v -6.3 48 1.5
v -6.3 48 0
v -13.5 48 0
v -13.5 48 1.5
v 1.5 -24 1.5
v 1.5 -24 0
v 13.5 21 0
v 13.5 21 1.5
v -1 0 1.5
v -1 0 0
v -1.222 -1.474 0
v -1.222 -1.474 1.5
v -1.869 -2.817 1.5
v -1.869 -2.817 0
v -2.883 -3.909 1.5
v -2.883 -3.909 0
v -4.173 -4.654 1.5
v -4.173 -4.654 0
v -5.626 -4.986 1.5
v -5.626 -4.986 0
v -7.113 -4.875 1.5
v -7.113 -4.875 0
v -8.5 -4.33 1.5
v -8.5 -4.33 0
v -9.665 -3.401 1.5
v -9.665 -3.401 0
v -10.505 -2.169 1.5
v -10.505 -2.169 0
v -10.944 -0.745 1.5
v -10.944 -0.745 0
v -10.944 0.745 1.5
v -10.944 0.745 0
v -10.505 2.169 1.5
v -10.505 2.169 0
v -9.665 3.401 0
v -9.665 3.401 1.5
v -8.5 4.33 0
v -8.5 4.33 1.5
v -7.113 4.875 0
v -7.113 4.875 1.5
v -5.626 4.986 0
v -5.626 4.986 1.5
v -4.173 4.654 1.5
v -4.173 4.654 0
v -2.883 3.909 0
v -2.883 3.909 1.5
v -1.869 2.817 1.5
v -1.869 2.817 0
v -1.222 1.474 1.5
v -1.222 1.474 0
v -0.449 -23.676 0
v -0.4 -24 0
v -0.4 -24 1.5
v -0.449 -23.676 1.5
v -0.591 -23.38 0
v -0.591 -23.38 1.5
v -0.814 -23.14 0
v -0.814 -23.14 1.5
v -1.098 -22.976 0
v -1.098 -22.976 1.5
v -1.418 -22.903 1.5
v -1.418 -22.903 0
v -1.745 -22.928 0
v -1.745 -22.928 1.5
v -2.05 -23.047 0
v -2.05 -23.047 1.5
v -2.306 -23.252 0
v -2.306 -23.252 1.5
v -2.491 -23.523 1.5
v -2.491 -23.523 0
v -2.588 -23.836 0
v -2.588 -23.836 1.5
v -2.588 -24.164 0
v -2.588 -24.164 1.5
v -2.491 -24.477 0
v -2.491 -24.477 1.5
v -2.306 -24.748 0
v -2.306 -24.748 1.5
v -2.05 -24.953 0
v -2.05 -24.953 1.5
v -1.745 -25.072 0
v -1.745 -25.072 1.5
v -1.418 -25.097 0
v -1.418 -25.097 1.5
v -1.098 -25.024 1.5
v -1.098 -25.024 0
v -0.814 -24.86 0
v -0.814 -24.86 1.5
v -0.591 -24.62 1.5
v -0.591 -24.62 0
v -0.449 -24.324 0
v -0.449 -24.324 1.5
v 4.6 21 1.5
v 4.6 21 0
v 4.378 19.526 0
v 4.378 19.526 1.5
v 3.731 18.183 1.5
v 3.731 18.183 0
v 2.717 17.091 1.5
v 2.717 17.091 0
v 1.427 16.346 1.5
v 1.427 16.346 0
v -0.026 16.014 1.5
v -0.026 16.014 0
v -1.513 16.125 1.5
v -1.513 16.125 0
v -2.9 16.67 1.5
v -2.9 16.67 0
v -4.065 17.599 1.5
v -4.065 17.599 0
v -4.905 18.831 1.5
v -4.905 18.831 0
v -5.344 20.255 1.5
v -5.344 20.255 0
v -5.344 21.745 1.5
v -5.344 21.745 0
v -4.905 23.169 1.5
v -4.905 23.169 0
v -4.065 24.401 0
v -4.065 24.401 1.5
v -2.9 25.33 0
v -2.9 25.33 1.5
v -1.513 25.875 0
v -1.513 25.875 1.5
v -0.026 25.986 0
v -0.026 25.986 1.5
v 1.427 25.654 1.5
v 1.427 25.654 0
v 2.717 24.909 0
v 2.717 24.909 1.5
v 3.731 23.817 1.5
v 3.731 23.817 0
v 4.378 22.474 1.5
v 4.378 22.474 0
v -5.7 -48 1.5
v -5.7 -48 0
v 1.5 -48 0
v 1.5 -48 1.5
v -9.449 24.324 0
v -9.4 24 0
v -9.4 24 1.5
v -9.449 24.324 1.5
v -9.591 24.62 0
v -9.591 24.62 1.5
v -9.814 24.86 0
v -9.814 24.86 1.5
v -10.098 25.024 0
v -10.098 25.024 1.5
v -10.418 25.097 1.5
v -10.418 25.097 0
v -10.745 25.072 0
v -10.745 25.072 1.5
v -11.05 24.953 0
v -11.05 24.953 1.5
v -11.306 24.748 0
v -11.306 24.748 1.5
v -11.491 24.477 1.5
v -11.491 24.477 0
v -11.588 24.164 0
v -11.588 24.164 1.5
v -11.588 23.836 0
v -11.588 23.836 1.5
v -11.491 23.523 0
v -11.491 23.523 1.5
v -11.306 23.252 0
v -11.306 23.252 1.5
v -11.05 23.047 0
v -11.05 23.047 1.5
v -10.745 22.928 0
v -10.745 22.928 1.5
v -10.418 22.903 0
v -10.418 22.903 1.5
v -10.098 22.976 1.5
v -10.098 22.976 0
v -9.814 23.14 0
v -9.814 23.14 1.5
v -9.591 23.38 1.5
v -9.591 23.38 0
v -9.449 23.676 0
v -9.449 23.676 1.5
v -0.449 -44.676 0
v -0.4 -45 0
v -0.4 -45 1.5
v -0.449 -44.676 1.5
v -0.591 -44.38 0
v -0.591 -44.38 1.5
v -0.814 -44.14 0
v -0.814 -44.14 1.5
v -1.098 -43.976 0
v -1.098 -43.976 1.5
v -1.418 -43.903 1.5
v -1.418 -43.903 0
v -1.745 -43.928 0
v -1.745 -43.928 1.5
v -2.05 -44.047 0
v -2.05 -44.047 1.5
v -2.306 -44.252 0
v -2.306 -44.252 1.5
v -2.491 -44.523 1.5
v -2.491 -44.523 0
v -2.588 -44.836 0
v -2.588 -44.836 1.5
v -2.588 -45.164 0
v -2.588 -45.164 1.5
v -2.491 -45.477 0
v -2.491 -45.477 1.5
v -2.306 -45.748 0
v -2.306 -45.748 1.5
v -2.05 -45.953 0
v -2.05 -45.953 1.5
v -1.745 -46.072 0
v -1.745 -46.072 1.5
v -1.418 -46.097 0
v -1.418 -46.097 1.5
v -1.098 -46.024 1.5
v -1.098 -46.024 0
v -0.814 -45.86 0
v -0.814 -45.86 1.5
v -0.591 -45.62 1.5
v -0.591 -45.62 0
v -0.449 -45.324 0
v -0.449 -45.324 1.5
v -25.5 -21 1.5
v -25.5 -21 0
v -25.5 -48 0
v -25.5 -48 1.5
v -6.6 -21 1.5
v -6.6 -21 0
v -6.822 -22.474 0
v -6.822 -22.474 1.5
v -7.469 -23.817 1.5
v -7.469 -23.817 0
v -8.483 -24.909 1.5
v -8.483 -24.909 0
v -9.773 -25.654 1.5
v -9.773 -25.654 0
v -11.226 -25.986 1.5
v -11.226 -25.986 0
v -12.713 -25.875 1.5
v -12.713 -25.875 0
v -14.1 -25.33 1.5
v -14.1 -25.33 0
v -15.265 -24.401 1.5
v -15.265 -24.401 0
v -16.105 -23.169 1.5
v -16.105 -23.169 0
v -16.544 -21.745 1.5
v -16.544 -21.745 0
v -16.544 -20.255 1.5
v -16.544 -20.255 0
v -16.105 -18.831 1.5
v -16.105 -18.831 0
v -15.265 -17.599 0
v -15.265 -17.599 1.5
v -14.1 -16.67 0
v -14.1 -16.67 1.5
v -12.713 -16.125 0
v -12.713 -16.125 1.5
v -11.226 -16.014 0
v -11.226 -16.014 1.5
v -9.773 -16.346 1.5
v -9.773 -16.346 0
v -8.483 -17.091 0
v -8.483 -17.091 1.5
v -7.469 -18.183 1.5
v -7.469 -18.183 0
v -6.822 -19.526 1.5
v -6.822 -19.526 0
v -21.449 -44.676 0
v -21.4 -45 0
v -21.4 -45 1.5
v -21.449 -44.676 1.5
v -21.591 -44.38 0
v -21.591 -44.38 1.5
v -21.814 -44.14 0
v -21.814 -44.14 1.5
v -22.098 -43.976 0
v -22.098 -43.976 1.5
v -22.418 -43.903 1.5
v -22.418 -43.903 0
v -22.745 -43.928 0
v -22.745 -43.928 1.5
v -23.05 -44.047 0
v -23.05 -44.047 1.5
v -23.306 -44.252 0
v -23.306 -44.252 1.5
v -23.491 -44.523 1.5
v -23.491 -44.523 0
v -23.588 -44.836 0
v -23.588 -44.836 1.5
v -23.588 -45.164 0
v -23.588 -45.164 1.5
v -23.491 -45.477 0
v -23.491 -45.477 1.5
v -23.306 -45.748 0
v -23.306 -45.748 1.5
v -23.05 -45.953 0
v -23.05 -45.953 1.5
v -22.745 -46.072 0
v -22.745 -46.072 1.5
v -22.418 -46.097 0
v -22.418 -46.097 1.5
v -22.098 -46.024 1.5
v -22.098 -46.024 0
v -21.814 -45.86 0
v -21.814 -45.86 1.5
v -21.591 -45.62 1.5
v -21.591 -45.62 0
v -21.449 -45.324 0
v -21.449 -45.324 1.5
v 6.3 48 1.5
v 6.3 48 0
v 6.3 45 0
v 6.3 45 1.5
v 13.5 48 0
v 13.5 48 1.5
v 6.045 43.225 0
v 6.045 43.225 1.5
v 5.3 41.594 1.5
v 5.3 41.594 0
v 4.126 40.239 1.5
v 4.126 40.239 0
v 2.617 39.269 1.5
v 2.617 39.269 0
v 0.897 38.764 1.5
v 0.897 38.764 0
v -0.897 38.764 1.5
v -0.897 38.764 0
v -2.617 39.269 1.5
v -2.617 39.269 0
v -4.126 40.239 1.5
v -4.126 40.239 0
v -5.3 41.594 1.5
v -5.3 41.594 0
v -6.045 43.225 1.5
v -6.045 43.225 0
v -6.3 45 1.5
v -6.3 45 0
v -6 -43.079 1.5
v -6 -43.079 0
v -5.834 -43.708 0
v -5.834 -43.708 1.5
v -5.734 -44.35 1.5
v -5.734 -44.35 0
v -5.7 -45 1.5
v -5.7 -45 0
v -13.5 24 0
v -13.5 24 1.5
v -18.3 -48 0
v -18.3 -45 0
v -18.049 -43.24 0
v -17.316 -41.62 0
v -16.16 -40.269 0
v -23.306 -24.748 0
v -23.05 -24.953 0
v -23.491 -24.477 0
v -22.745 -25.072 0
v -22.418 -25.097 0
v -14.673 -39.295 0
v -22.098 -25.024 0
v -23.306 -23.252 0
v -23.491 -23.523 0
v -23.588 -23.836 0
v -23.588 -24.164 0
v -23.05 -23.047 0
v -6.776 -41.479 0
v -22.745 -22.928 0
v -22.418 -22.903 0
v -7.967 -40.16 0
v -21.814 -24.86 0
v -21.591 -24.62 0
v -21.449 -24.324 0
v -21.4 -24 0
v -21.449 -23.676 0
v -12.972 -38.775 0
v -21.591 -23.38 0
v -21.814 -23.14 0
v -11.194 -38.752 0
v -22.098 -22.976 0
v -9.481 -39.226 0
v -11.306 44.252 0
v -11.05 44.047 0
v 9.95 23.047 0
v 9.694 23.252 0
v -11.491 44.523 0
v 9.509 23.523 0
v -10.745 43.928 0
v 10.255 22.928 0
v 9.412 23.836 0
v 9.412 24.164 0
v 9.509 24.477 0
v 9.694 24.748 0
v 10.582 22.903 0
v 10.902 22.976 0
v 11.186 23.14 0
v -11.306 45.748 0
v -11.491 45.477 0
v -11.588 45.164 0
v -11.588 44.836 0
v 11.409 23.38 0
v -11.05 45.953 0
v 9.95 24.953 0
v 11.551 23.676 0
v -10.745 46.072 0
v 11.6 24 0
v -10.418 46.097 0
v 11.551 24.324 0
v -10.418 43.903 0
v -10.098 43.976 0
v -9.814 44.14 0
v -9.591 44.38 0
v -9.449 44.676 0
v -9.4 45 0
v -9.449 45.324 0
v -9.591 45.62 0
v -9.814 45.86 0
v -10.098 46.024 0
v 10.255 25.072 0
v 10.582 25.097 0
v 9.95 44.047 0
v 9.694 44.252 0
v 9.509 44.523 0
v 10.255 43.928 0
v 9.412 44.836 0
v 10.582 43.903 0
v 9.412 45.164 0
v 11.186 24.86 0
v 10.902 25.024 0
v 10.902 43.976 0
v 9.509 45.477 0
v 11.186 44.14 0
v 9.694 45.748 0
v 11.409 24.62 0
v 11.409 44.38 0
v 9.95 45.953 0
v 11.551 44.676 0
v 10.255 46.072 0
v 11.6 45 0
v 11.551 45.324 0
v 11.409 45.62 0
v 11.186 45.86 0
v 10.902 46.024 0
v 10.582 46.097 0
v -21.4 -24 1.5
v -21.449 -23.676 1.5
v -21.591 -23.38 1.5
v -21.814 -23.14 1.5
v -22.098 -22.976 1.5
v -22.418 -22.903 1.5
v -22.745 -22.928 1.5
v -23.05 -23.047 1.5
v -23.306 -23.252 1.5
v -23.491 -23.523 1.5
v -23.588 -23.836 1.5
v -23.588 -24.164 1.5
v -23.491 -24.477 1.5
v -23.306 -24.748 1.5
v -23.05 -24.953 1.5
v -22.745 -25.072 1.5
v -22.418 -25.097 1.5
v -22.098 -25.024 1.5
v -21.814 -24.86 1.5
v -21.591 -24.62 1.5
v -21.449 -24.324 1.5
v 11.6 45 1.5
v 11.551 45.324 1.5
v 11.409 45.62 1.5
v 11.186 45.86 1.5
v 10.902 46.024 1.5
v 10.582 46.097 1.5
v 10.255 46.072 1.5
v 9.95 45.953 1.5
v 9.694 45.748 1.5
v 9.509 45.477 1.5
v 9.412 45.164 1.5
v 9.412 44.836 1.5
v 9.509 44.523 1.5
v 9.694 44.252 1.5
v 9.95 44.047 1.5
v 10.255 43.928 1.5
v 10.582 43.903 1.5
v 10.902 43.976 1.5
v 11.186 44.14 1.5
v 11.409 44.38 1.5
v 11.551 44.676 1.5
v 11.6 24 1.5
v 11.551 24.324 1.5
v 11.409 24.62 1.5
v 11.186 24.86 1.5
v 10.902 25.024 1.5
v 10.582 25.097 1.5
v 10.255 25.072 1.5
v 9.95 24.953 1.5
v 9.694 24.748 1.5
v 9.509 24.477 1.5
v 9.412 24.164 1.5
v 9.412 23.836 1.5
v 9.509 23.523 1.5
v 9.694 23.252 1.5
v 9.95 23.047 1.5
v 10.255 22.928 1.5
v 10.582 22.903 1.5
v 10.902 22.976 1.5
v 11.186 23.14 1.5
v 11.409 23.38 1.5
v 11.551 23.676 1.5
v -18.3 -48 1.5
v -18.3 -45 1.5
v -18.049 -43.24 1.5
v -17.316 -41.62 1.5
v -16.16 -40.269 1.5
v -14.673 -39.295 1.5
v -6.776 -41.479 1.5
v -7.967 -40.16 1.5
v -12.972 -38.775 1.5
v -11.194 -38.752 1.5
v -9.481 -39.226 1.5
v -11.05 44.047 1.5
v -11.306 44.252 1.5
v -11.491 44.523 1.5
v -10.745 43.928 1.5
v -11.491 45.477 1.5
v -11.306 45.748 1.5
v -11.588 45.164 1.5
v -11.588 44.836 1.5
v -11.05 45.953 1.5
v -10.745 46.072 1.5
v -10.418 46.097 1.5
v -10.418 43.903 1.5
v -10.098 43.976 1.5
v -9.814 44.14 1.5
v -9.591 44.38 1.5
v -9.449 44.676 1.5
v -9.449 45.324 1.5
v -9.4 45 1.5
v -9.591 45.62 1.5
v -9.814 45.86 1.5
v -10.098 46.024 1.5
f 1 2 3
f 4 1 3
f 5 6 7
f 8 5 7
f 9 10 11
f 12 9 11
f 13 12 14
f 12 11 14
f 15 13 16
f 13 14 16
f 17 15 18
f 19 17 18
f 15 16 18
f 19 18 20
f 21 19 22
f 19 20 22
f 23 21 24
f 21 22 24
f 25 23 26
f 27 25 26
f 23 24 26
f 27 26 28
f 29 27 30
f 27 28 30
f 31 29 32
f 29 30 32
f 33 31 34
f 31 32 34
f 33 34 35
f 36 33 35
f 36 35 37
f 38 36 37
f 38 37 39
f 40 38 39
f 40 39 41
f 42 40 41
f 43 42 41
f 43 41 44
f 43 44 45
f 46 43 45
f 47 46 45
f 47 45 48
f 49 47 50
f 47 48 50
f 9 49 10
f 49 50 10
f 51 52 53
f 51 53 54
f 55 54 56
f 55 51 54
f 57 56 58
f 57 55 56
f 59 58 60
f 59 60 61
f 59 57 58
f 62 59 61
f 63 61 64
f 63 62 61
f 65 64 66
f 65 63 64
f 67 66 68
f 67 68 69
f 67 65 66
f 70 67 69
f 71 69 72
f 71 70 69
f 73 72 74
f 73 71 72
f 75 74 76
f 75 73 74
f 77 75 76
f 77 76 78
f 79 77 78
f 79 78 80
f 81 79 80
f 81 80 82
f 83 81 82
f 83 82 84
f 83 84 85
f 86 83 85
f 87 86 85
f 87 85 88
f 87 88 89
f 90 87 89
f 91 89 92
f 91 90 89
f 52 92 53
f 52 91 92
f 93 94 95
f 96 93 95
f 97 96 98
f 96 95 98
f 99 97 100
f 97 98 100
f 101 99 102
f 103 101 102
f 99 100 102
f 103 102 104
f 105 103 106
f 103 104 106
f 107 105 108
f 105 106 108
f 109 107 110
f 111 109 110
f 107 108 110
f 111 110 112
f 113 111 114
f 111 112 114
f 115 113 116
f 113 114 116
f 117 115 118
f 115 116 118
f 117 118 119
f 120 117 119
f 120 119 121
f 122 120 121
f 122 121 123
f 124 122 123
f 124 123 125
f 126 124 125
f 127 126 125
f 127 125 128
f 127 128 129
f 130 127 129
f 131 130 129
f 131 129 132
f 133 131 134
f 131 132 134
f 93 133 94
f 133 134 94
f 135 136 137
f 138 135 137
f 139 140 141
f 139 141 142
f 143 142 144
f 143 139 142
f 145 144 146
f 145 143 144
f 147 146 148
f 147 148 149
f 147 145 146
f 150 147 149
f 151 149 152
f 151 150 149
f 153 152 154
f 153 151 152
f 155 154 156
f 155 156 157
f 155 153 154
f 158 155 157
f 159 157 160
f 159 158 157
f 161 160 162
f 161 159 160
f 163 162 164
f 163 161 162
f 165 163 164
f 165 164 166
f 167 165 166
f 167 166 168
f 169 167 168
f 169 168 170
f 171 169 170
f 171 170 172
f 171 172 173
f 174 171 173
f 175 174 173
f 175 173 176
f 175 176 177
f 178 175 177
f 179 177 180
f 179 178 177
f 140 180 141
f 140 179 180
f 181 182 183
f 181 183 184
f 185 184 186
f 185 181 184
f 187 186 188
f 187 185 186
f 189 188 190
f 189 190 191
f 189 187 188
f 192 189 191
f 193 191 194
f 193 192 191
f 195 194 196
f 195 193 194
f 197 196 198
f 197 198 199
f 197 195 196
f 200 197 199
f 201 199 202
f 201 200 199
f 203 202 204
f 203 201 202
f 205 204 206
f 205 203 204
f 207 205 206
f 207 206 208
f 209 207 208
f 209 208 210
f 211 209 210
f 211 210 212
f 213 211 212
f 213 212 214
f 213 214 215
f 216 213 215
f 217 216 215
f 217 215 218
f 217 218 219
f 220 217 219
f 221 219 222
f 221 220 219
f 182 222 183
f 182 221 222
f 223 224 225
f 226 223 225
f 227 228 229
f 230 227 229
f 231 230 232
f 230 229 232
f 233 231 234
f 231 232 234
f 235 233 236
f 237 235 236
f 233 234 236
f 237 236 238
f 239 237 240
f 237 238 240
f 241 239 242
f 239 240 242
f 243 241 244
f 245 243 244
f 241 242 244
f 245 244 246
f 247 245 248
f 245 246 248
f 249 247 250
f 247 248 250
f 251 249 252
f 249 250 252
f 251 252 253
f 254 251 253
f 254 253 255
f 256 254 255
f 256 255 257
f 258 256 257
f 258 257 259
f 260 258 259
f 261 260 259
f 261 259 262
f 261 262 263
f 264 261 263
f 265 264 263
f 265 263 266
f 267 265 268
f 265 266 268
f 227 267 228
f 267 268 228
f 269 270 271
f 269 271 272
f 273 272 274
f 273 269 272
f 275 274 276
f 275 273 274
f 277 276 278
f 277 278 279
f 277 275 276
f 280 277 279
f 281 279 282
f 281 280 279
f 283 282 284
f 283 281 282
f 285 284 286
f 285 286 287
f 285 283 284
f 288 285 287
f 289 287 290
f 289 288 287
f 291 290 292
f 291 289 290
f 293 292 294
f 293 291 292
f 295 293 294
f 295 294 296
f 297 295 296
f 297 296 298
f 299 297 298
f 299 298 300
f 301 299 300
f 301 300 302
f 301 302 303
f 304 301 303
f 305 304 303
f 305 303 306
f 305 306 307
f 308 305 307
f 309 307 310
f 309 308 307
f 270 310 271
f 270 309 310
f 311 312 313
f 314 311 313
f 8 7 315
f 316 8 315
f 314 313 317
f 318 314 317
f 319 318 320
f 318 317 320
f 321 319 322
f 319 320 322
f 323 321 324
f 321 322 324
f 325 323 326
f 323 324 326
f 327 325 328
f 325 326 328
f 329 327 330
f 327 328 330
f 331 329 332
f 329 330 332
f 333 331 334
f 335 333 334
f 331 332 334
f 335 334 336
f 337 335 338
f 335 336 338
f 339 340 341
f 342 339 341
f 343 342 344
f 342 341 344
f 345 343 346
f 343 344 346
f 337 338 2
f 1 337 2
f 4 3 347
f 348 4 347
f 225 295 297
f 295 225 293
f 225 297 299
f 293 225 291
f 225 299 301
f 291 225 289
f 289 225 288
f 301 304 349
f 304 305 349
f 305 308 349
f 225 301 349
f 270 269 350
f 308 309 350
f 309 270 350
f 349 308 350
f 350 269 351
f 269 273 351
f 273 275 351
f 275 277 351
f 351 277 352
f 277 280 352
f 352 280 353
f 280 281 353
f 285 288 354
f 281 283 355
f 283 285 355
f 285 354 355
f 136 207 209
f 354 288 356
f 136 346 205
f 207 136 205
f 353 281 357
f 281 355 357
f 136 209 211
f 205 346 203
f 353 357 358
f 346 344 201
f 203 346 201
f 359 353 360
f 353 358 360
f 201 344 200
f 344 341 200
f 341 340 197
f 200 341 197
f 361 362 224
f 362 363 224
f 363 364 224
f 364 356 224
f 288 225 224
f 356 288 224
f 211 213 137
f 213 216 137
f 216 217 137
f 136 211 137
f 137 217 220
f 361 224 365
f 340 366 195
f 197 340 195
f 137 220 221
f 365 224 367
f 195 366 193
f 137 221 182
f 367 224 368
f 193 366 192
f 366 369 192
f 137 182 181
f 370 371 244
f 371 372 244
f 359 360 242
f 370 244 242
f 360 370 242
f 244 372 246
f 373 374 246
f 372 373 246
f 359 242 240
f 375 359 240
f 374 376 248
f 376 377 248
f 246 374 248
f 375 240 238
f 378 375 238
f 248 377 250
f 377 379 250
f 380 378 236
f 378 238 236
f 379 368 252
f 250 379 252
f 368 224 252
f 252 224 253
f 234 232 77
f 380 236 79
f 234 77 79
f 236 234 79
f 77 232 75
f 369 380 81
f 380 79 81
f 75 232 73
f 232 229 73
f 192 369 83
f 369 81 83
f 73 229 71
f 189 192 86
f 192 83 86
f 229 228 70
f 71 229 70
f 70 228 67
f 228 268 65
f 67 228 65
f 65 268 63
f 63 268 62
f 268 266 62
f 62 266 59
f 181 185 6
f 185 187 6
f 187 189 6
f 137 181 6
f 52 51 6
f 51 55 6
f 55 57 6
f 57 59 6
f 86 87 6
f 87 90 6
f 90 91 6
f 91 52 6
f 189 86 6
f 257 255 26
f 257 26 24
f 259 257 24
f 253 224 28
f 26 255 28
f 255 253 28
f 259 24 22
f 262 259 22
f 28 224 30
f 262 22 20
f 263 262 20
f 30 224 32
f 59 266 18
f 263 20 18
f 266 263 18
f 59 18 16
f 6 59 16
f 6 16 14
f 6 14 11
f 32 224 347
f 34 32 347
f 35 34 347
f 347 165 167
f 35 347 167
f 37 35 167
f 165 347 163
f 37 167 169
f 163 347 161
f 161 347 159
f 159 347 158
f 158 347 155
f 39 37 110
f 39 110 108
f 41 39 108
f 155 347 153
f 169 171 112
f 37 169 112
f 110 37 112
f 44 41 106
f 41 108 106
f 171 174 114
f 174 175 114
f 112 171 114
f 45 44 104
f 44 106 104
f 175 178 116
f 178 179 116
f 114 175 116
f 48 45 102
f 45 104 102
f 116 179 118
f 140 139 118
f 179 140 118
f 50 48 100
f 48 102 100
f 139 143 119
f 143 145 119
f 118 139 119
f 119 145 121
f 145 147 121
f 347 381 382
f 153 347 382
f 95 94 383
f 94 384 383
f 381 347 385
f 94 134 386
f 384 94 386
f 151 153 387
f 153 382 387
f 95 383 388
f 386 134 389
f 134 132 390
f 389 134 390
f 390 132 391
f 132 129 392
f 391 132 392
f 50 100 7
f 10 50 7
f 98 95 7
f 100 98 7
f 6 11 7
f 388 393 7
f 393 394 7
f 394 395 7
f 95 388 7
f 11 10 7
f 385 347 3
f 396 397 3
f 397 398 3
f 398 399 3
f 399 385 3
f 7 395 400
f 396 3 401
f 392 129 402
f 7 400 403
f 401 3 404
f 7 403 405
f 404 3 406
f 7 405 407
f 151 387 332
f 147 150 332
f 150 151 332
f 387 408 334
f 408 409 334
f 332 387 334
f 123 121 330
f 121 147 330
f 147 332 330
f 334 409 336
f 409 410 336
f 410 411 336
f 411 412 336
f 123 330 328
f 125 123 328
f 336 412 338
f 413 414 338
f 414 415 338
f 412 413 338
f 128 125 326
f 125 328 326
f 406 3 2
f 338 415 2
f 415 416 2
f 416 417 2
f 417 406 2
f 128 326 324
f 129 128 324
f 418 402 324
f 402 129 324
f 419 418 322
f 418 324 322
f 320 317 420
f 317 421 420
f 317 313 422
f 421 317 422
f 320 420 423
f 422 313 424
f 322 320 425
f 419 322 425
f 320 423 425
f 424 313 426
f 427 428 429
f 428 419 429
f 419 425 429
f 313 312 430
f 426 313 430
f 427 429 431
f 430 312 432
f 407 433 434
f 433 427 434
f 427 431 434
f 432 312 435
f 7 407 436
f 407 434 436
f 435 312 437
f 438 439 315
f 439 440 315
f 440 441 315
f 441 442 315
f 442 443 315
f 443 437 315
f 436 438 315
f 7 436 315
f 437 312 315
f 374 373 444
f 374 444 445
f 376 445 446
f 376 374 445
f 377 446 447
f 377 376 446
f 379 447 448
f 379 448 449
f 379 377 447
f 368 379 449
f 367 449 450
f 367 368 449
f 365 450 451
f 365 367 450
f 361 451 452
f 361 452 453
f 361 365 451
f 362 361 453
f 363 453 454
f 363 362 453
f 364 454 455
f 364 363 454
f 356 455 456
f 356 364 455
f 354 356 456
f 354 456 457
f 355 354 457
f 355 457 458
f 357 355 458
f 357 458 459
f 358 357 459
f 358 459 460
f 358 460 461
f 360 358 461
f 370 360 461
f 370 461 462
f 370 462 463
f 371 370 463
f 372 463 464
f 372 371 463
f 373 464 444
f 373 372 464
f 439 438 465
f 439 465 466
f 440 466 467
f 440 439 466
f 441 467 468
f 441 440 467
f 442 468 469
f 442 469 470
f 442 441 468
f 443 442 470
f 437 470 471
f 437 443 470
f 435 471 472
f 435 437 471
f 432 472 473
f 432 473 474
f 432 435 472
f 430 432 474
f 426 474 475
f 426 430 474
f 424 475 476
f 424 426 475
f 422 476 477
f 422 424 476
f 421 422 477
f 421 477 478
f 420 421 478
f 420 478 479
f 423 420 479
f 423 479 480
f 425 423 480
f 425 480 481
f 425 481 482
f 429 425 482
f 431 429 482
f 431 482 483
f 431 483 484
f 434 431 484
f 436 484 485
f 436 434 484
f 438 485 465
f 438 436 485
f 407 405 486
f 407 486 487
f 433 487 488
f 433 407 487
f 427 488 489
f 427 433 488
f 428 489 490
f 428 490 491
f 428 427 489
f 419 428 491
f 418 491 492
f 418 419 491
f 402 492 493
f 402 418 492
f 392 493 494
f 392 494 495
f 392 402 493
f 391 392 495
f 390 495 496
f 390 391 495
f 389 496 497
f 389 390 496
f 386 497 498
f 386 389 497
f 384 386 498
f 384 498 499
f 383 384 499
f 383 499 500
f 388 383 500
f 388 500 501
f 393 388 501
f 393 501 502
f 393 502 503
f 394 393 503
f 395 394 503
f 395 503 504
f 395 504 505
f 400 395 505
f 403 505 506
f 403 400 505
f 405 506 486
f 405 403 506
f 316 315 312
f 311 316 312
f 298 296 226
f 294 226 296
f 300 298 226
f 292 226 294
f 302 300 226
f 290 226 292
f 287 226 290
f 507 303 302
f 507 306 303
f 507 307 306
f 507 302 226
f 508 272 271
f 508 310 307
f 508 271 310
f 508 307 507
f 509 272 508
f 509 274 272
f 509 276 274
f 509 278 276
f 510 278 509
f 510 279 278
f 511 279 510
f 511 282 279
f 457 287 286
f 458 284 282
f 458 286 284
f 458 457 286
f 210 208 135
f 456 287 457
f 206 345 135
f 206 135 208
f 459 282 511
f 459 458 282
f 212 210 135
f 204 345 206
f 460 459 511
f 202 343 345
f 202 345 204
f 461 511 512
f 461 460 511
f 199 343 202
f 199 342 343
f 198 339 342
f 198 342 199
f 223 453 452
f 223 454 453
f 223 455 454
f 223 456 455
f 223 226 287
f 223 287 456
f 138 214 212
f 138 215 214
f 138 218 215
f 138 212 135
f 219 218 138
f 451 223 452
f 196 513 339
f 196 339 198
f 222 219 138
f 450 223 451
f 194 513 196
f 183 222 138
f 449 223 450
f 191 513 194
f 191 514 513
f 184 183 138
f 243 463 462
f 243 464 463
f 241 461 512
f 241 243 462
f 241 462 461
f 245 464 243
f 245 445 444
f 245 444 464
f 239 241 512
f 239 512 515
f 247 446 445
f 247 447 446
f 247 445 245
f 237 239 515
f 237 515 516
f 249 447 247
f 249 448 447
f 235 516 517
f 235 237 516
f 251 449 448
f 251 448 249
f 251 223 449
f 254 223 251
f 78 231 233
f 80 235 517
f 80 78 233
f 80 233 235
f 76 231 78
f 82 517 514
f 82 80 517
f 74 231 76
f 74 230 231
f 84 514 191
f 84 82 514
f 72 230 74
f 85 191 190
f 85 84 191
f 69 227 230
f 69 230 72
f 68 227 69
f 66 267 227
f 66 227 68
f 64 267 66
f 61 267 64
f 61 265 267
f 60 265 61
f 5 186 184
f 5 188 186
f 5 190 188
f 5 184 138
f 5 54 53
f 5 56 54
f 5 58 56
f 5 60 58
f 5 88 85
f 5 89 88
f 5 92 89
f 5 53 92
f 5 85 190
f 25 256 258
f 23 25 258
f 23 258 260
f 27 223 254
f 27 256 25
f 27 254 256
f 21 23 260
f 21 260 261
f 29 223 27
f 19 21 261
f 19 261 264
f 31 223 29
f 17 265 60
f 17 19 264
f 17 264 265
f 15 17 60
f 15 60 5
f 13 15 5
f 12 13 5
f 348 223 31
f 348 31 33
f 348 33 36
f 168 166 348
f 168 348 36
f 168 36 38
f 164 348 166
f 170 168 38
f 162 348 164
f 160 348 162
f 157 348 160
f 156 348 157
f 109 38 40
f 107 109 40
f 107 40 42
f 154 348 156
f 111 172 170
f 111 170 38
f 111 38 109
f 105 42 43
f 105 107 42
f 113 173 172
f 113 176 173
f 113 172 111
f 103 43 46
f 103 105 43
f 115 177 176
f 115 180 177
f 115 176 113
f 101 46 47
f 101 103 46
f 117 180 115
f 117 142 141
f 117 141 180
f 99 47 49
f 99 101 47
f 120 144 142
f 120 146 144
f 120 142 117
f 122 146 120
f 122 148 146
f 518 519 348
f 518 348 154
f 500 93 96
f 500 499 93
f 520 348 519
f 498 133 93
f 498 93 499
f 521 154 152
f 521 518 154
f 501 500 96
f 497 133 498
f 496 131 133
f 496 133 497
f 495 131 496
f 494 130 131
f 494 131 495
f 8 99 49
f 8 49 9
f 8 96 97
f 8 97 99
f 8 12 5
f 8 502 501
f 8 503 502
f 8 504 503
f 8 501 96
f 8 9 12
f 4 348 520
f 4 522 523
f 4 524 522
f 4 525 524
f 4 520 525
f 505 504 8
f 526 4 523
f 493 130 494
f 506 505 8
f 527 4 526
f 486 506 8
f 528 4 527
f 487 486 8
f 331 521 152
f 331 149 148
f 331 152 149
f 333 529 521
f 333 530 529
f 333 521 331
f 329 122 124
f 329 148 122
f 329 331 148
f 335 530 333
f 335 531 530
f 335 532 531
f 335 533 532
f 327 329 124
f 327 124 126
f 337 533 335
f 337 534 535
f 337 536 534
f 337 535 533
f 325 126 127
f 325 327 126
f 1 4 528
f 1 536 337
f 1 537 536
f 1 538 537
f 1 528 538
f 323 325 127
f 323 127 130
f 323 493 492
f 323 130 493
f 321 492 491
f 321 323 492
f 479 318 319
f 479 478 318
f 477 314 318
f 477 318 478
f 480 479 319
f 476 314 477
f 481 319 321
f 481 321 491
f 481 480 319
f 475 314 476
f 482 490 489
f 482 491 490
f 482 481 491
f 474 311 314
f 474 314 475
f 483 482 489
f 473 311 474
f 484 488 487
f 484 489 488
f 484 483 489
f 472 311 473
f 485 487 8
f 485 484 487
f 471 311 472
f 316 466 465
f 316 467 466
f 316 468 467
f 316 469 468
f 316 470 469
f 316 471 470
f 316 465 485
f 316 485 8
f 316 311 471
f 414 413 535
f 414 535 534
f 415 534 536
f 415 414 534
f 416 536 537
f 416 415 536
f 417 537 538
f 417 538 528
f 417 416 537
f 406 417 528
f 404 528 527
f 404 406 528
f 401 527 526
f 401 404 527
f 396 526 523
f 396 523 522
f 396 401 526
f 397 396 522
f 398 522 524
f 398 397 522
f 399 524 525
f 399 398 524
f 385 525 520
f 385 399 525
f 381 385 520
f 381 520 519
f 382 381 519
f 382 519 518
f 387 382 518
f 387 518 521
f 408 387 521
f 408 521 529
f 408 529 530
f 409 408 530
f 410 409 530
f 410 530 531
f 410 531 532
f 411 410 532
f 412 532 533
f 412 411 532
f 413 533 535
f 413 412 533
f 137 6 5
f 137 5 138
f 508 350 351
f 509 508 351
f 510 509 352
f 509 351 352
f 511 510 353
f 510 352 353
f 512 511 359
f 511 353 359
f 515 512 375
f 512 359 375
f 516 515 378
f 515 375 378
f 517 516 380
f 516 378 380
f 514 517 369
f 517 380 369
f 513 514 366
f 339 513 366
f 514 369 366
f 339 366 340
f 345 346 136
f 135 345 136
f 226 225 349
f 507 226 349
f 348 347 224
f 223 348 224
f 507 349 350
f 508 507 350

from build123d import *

# Parameters (mm, degrees)
F0_R     = 1.1
F1_DEPTH = 1.5
F2_W     = 12
F2_H     = 24
F3_DEPTH = 1.5
F4_R     = 5
F5_DEPTH = 1.5


# Not quite as in the source:
# - a feature names something its author has since deleted; it is built from what else it names


with BuildPart() as f1:
    # F0 (on Top) → F1 (new body)
    with BuildSketch(Plane.XY):
        with BuildLine():
            Line((-5.7, -48), (6.3, -48))
            Line((6.3, -48), (6.3, -45))
            ThreePointArc((6.3, -45), (0.9721111048, -38.7754518236), (-6, -43.0790627288))
            ThreePointArc((-6, -43.0790627288), (-5.7754518236, -44.0278888952), (-5.7, -45))
            Line((-5.7, -45), (-5.7, -48))
        make_face()
        with Locations((-1.5, -45)):
            Circle(F0_R, mode=Mode.SUBTRACT)
        with BuildLine():
            Line((25.5, -48), (25.5, 48))
            Line((25.5, 48), (6.3, 48))
            Line((6.3, 48), (6.3, 45))
            ThreePointArc((6.3, 45), (0, 38.7), (-6.3, 45))
            Line((-6.3, 45), (-6.3, 48))
            Line((-6.3, 48), (-25.5, 48))
            Line((-25.5, 48), (-25.5, -48))
            Line((-25.5, -48), (-18.3, -48))
            Line((-18.3, -48), (-18.3, -45))
            ThreePointArc((-18.3, -45), (-12.9721111048, -38.7754518236), (-6, -43.0790627288))
            ThreePointArc((-6, -43.0790627288), (0.9721111048, -38.7754518236), (6.3, -45))
            Line((6.3, -45), (6.3, -48))
            Line((6.3, -48), (25.5, -48))
        make_face()
        with Locations((-22.5, -45)):
            Circle(F0_R, mode=Mode.SUBTRACT)
        with Locations((-22.5, -24)):
            Circle(F0_R, mode=Mode.SUBTRACT)
        with Locations((-10.5, -24)):
            Circle(F0_R, mode=Mode.SUBTRACT)
        with Locations((-1.5, -24)):
            Circle(F0_R, mode=Mode.SUBTRACT)
        with Locations((10.5, -45)):
            Circle(F0_R, mode=Mode.SUBTRACT)
        with Locations((10.5, -24)):
            Circle(F0_R, mode=Mode.SUBTRACT)
        with Locations((-10.5, 24)):
            Circle(F0_R, mode=Mode.SUBTRACT)
        with Locations((-10.5, 45)):
            Circle(F0_R, mode=Mode.SUBTRACT)
        with Locations((10.5, 24)):
            Circle(F0_R, mode=Mode.SUBTRACT)
        with Locations((10.5, 45)):
            Circle(F0_R, mode=Mode.SUBTRACT)
        with Locations((-10.5, -24)):
            Circle(F0_R)
        with Locations((10.5, -45)):
            Circle(F0_R)
        with Locations((10.5, -24)):
            Circle(F0_R)
    extrude(amount=F1_DEPTH)

    # F2 (on face) → F3 (cut, through all)
    with BuildSketch(Plane(origin=(0, 0, 0), x_dir=(1, 0, 0), z_dir=(0, 0, -1))):
        Polygon((-13.5, -24), (-25.5, 21), (-25.5, -24), align=None)
        Polygon((25.5, 48), (13.5, 48), (13.5, 24), (13.5, -21), (13.5, -48), (25.5, -48), align=None)
        with Locations((-19.5, -36)):
            Rectangle(F2_W, F2_H)
        with Locations((7.5, 36)):
            Rectangle(F2_W, F2_H)
        Polygon((13.5, 24), (1.5, 24), (13.5, -21), align=None)
    extrude(amount=-F3_DEPTH, mode=Mode.SUBTRACT)

    # F4 (on face) → F5 (cut, through all)
    with BuildSketch(Plane(origin=(0, 0, 0), x_dir=(1, 0, 0), z_dir=(0, 0, -1))):
        with Locations((-0.4, -21)):
            Circle(F4_R)
        with Locations((-11.6, 21)):
            Circle(F4_R)
        with Locations((-6, 0)):
            Circle(F4_R)
    extrude(amount=-F5_DEPTH, mode=Mode.SUBTRACT)


solid = f1.part
